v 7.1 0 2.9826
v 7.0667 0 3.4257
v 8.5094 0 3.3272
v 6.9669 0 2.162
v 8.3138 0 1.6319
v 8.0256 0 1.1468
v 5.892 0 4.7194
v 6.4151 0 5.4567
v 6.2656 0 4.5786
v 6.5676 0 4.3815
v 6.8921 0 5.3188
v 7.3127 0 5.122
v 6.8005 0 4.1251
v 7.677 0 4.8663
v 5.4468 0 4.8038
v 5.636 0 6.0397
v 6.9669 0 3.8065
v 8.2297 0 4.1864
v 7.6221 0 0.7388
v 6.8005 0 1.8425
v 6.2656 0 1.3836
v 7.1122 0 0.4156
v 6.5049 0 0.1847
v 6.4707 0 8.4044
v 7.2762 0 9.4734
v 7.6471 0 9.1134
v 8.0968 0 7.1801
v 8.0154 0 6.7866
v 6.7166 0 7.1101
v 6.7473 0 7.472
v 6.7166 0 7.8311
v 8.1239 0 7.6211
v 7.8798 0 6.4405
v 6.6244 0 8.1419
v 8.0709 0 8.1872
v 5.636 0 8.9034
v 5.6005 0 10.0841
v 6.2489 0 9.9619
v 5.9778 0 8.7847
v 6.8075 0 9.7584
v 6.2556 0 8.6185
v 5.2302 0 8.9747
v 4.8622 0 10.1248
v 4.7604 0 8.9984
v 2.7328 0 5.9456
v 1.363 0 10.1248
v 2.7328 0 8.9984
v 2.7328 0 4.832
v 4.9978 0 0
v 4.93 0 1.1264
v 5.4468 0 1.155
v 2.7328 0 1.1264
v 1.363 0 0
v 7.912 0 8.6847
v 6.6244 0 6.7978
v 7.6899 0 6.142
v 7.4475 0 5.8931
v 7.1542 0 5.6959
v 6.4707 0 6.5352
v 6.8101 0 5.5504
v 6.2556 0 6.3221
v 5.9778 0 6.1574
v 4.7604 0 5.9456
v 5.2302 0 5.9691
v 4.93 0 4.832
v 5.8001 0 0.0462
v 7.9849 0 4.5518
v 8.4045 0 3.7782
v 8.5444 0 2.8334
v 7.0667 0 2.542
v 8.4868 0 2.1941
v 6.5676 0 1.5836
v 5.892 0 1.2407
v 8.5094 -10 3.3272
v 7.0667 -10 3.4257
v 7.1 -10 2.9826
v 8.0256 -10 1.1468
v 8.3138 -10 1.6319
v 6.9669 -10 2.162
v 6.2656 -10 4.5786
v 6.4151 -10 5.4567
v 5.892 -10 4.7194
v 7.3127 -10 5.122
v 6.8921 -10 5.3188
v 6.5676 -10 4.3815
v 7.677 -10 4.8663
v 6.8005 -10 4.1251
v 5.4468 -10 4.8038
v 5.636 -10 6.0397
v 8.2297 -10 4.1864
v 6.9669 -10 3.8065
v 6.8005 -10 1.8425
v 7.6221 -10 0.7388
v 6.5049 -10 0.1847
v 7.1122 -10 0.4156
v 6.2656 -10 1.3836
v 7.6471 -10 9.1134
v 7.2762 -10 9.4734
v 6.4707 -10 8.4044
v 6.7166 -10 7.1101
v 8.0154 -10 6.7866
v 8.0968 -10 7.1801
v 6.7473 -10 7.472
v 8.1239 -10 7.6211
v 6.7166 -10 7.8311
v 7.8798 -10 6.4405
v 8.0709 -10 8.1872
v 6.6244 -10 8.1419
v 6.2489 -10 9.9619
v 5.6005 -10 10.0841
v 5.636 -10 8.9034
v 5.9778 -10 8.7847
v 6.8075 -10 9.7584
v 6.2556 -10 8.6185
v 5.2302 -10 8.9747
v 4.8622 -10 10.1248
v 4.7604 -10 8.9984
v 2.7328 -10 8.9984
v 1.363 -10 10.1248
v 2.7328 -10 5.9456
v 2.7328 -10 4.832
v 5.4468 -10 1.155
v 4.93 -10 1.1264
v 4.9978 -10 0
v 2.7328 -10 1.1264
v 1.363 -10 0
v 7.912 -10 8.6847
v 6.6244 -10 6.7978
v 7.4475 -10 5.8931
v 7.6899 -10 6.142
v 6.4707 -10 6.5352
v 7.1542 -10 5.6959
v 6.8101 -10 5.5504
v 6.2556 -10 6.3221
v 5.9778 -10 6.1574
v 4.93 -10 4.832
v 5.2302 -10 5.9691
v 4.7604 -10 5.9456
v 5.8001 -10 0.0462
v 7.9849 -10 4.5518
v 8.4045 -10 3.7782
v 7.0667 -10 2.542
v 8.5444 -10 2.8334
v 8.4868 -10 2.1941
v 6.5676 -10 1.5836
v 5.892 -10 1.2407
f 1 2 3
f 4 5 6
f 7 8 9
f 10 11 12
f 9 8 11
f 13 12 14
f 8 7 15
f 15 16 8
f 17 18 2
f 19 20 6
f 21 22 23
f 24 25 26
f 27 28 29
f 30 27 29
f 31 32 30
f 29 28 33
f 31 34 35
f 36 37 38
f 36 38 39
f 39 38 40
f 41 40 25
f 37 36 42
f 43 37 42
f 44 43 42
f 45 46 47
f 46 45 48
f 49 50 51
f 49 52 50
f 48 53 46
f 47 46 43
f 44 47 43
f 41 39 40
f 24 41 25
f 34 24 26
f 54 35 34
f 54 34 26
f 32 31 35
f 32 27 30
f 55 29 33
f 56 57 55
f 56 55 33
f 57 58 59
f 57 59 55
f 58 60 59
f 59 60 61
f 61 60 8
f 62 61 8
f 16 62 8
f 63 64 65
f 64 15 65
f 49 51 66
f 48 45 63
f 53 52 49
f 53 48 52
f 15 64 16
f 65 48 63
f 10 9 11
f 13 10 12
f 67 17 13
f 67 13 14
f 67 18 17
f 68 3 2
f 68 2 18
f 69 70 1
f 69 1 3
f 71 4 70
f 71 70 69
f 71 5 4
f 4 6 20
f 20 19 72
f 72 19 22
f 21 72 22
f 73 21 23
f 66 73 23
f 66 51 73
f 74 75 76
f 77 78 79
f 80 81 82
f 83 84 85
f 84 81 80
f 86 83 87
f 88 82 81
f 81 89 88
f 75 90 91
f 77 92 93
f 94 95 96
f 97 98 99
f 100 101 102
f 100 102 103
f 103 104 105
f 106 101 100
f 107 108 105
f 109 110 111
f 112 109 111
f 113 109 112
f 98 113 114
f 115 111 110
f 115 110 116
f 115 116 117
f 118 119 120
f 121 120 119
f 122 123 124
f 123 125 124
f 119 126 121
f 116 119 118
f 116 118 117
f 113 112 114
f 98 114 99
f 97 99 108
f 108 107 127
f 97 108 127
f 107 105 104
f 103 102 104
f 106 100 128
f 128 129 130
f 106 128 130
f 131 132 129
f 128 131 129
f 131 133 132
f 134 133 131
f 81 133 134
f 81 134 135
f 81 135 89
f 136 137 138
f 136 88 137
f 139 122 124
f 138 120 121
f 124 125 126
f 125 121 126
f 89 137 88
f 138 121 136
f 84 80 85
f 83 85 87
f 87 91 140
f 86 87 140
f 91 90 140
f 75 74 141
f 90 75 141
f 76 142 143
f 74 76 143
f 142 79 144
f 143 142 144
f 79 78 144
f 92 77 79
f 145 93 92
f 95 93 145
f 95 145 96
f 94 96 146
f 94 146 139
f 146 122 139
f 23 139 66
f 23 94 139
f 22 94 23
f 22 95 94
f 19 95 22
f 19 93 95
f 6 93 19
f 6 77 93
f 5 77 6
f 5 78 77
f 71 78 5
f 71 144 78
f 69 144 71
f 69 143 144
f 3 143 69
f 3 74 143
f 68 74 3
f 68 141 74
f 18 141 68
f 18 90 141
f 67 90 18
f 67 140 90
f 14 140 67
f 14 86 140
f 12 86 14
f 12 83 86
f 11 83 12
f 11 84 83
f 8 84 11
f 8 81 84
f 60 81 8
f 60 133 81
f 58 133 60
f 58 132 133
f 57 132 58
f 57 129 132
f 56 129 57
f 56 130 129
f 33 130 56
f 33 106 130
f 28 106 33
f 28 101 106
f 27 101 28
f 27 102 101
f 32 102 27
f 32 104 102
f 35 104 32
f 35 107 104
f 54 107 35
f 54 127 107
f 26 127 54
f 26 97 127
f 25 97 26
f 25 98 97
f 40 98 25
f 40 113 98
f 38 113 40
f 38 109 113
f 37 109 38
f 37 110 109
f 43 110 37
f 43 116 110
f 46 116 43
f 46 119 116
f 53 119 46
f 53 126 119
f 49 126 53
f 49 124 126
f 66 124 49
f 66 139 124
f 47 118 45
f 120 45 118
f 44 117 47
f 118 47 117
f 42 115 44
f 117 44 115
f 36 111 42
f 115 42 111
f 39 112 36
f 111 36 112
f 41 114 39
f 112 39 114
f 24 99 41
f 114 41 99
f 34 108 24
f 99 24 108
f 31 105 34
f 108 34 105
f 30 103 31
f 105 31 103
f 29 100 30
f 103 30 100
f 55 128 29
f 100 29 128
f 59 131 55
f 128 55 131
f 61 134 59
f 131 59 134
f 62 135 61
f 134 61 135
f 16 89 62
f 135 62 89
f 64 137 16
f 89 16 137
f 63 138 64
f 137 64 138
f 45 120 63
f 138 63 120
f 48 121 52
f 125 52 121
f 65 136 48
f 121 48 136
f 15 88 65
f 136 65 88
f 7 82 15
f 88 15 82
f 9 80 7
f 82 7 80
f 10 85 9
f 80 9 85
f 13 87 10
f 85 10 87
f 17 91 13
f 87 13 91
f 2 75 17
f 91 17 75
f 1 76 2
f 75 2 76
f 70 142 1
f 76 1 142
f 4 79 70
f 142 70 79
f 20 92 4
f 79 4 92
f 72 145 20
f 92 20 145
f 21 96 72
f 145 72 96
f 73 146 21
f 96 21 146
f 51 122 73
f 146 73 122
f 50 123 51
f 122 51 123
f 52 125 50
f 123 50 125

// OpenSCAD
// Generated by SolidPython 1.1.3 on 2025-02-16 19:33:44


rotate(a = 90, v = [1, 0, 0]) {
	linear_extrude(height = 10) {
		text(font = "Ariel", size = 10, text = "B");
	}
}
/***********************************************
*********      SolidPython code:      **********
************************************************
 
from solid import *
from solid.utils import *
import subprocess

def letter_3d(letter, size, font):
    letter_2d = text(text=letter, size=size, font=font)

    letter_3d = linear_extrude(height=size)(letter_2d)

    return letter_3d

def intersection_3d(letter1, letter2, size, font):
    letter1_3d = letter_3d(letter1, size, font)
    letter2_3d = letter_3d(letter2, size, font)

    letter2_3d = rotate(a=90, v=[1,0,0])(letter2_3d)

    intersect = intersection()(letter1_3d, letter2_3d)

    return intersect



if __name__ == "__main__":
    # shape = intersection_3d("A", "B", 10, "Arial")
    shapeA = letter_3d("A", 10, "Ariel")
    scad_render_to_file(shapeA, 'A.scad')

    shapeB = letter_3d("B", 10, "Ariel")
    shapeB = rotate(a=90, v=[1,0,0])(shapeB)
    scad_render_to_file(shapeB, "B.scad")

    subprocess.run(["C:\\Program Files\\OpenSCAD\\openscad.exe", "-o", "A.stl", "A.scad"])
    subprocess.run(["C:\\Program Files\\OpenSCAD\\openscad.exe", "-o", "B.stl", "B.scad"])

 
 
************************************************/
